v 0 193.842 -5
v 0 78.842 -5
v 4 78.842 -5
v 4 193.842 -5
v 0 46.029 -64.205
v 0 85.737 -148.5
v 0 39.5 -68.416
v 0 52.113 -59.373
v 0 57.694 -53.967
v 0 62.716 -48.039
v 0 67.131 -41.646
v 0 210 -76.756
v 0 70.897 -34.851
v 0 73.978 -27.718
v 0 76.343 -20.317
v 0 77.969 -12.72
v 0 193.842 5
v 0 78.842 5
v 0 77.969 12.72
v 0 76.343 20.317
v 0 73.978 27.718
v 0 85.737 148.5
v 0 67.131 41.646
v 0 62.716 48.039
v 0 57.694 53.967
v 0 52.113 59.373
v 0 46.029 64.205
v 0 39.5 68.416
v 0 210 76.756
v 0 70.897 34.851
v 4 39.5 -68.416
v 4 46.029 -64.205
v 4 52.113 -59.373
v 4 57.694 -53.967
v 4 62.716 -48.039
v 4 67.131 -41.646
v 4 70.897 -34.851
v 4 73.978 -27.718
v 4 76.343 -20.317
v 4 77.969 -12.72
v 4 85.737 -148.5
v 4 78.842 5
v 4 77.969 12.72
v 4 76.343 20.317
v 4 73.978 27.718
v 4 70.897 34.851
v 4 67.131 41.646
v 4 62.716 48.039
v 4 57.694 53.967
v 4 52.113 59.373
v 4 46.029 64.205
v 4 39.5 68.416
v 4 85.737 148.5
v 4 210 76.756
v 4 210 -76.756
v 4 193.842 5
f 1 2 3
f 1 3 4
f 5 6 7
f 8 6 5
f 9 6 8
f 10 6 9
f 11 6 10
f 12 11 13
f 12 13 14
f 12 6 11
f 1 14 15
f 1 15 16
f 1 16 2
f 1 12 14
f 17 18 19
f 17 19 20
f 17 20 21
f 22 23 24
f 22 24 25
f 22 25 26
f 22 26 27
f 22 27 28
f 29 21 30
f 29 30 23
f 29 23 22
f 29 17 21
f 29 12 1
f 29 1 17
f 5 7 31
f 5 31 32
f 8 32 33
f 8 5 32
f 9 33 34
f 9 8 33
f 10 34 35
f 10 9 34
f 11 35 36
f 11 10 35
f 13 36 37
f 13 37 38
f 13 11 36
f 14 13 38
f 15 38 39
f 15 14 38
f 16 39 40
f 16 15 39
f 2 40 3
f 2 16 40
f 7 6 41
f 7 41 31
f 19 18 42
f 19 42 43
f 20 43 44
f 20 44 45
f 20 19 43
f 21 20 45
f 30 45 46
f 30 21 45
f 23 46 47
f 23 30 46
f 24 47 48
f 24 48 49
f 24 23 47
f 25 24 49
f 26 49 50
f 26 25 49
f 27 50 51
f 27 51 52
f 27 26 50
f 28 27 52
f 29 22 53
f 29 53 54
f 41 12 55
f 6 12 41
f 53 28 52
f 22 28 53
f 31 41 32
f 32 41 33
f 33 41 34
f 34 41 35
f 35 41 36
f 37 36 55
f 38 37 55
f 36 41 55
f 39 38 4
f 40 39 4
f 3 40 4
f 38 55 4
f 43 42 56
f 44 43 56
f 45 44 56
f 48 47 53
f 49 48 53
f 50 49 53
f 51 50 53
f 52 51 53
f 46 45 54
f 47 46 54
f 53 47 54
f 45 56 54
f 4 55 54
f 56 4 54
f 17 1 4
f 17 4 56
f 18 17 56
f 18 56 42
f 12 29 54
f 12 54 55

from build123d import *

# Parameters (mm, degrees)
BOSS_EXTRU_1_DEPTH = 4


with BuildPart() as part:
    # Esquisse1 → Boss.-Extru.1 (new body)
    with BuildSketch(Plane(origin=(0, 0, 0), x_dir=(0, 0, -1), z_dir=(1, 0, 0))):
        with BuildLine():
            Line((-68.416006899, 39.5), (-148.5, 85.736514975))
            Line((-148.5, 85.736514975), (-76.75644347, 210))
            Line((-76.75644347, 210), (76.75644347, 210))
            Line((76.75644347, 210), (148.5, 85.736514975))
            Line((148.5, 85.736514975), (68.416006899, 39.5))
            ThreePointArc((68.416006899, 39.5), (41.646346215, 67.13107959), (5, 78.841613378))
            Line((5, 78.841613378), (5, 193.841613378))
            Line((5, 193.841613378), (-5, 193.841613378))
            Line((-5, 193.841613378), (-5, 78.841613378))
            ThreePointArc((-5, 78.841613378), (-41.646346215, 67.13107959), (-68.416006899, 39.5))
        make_face()
    extrude(amount=BOSS_EXTRU_1_DEPTH)


solid = part.part
